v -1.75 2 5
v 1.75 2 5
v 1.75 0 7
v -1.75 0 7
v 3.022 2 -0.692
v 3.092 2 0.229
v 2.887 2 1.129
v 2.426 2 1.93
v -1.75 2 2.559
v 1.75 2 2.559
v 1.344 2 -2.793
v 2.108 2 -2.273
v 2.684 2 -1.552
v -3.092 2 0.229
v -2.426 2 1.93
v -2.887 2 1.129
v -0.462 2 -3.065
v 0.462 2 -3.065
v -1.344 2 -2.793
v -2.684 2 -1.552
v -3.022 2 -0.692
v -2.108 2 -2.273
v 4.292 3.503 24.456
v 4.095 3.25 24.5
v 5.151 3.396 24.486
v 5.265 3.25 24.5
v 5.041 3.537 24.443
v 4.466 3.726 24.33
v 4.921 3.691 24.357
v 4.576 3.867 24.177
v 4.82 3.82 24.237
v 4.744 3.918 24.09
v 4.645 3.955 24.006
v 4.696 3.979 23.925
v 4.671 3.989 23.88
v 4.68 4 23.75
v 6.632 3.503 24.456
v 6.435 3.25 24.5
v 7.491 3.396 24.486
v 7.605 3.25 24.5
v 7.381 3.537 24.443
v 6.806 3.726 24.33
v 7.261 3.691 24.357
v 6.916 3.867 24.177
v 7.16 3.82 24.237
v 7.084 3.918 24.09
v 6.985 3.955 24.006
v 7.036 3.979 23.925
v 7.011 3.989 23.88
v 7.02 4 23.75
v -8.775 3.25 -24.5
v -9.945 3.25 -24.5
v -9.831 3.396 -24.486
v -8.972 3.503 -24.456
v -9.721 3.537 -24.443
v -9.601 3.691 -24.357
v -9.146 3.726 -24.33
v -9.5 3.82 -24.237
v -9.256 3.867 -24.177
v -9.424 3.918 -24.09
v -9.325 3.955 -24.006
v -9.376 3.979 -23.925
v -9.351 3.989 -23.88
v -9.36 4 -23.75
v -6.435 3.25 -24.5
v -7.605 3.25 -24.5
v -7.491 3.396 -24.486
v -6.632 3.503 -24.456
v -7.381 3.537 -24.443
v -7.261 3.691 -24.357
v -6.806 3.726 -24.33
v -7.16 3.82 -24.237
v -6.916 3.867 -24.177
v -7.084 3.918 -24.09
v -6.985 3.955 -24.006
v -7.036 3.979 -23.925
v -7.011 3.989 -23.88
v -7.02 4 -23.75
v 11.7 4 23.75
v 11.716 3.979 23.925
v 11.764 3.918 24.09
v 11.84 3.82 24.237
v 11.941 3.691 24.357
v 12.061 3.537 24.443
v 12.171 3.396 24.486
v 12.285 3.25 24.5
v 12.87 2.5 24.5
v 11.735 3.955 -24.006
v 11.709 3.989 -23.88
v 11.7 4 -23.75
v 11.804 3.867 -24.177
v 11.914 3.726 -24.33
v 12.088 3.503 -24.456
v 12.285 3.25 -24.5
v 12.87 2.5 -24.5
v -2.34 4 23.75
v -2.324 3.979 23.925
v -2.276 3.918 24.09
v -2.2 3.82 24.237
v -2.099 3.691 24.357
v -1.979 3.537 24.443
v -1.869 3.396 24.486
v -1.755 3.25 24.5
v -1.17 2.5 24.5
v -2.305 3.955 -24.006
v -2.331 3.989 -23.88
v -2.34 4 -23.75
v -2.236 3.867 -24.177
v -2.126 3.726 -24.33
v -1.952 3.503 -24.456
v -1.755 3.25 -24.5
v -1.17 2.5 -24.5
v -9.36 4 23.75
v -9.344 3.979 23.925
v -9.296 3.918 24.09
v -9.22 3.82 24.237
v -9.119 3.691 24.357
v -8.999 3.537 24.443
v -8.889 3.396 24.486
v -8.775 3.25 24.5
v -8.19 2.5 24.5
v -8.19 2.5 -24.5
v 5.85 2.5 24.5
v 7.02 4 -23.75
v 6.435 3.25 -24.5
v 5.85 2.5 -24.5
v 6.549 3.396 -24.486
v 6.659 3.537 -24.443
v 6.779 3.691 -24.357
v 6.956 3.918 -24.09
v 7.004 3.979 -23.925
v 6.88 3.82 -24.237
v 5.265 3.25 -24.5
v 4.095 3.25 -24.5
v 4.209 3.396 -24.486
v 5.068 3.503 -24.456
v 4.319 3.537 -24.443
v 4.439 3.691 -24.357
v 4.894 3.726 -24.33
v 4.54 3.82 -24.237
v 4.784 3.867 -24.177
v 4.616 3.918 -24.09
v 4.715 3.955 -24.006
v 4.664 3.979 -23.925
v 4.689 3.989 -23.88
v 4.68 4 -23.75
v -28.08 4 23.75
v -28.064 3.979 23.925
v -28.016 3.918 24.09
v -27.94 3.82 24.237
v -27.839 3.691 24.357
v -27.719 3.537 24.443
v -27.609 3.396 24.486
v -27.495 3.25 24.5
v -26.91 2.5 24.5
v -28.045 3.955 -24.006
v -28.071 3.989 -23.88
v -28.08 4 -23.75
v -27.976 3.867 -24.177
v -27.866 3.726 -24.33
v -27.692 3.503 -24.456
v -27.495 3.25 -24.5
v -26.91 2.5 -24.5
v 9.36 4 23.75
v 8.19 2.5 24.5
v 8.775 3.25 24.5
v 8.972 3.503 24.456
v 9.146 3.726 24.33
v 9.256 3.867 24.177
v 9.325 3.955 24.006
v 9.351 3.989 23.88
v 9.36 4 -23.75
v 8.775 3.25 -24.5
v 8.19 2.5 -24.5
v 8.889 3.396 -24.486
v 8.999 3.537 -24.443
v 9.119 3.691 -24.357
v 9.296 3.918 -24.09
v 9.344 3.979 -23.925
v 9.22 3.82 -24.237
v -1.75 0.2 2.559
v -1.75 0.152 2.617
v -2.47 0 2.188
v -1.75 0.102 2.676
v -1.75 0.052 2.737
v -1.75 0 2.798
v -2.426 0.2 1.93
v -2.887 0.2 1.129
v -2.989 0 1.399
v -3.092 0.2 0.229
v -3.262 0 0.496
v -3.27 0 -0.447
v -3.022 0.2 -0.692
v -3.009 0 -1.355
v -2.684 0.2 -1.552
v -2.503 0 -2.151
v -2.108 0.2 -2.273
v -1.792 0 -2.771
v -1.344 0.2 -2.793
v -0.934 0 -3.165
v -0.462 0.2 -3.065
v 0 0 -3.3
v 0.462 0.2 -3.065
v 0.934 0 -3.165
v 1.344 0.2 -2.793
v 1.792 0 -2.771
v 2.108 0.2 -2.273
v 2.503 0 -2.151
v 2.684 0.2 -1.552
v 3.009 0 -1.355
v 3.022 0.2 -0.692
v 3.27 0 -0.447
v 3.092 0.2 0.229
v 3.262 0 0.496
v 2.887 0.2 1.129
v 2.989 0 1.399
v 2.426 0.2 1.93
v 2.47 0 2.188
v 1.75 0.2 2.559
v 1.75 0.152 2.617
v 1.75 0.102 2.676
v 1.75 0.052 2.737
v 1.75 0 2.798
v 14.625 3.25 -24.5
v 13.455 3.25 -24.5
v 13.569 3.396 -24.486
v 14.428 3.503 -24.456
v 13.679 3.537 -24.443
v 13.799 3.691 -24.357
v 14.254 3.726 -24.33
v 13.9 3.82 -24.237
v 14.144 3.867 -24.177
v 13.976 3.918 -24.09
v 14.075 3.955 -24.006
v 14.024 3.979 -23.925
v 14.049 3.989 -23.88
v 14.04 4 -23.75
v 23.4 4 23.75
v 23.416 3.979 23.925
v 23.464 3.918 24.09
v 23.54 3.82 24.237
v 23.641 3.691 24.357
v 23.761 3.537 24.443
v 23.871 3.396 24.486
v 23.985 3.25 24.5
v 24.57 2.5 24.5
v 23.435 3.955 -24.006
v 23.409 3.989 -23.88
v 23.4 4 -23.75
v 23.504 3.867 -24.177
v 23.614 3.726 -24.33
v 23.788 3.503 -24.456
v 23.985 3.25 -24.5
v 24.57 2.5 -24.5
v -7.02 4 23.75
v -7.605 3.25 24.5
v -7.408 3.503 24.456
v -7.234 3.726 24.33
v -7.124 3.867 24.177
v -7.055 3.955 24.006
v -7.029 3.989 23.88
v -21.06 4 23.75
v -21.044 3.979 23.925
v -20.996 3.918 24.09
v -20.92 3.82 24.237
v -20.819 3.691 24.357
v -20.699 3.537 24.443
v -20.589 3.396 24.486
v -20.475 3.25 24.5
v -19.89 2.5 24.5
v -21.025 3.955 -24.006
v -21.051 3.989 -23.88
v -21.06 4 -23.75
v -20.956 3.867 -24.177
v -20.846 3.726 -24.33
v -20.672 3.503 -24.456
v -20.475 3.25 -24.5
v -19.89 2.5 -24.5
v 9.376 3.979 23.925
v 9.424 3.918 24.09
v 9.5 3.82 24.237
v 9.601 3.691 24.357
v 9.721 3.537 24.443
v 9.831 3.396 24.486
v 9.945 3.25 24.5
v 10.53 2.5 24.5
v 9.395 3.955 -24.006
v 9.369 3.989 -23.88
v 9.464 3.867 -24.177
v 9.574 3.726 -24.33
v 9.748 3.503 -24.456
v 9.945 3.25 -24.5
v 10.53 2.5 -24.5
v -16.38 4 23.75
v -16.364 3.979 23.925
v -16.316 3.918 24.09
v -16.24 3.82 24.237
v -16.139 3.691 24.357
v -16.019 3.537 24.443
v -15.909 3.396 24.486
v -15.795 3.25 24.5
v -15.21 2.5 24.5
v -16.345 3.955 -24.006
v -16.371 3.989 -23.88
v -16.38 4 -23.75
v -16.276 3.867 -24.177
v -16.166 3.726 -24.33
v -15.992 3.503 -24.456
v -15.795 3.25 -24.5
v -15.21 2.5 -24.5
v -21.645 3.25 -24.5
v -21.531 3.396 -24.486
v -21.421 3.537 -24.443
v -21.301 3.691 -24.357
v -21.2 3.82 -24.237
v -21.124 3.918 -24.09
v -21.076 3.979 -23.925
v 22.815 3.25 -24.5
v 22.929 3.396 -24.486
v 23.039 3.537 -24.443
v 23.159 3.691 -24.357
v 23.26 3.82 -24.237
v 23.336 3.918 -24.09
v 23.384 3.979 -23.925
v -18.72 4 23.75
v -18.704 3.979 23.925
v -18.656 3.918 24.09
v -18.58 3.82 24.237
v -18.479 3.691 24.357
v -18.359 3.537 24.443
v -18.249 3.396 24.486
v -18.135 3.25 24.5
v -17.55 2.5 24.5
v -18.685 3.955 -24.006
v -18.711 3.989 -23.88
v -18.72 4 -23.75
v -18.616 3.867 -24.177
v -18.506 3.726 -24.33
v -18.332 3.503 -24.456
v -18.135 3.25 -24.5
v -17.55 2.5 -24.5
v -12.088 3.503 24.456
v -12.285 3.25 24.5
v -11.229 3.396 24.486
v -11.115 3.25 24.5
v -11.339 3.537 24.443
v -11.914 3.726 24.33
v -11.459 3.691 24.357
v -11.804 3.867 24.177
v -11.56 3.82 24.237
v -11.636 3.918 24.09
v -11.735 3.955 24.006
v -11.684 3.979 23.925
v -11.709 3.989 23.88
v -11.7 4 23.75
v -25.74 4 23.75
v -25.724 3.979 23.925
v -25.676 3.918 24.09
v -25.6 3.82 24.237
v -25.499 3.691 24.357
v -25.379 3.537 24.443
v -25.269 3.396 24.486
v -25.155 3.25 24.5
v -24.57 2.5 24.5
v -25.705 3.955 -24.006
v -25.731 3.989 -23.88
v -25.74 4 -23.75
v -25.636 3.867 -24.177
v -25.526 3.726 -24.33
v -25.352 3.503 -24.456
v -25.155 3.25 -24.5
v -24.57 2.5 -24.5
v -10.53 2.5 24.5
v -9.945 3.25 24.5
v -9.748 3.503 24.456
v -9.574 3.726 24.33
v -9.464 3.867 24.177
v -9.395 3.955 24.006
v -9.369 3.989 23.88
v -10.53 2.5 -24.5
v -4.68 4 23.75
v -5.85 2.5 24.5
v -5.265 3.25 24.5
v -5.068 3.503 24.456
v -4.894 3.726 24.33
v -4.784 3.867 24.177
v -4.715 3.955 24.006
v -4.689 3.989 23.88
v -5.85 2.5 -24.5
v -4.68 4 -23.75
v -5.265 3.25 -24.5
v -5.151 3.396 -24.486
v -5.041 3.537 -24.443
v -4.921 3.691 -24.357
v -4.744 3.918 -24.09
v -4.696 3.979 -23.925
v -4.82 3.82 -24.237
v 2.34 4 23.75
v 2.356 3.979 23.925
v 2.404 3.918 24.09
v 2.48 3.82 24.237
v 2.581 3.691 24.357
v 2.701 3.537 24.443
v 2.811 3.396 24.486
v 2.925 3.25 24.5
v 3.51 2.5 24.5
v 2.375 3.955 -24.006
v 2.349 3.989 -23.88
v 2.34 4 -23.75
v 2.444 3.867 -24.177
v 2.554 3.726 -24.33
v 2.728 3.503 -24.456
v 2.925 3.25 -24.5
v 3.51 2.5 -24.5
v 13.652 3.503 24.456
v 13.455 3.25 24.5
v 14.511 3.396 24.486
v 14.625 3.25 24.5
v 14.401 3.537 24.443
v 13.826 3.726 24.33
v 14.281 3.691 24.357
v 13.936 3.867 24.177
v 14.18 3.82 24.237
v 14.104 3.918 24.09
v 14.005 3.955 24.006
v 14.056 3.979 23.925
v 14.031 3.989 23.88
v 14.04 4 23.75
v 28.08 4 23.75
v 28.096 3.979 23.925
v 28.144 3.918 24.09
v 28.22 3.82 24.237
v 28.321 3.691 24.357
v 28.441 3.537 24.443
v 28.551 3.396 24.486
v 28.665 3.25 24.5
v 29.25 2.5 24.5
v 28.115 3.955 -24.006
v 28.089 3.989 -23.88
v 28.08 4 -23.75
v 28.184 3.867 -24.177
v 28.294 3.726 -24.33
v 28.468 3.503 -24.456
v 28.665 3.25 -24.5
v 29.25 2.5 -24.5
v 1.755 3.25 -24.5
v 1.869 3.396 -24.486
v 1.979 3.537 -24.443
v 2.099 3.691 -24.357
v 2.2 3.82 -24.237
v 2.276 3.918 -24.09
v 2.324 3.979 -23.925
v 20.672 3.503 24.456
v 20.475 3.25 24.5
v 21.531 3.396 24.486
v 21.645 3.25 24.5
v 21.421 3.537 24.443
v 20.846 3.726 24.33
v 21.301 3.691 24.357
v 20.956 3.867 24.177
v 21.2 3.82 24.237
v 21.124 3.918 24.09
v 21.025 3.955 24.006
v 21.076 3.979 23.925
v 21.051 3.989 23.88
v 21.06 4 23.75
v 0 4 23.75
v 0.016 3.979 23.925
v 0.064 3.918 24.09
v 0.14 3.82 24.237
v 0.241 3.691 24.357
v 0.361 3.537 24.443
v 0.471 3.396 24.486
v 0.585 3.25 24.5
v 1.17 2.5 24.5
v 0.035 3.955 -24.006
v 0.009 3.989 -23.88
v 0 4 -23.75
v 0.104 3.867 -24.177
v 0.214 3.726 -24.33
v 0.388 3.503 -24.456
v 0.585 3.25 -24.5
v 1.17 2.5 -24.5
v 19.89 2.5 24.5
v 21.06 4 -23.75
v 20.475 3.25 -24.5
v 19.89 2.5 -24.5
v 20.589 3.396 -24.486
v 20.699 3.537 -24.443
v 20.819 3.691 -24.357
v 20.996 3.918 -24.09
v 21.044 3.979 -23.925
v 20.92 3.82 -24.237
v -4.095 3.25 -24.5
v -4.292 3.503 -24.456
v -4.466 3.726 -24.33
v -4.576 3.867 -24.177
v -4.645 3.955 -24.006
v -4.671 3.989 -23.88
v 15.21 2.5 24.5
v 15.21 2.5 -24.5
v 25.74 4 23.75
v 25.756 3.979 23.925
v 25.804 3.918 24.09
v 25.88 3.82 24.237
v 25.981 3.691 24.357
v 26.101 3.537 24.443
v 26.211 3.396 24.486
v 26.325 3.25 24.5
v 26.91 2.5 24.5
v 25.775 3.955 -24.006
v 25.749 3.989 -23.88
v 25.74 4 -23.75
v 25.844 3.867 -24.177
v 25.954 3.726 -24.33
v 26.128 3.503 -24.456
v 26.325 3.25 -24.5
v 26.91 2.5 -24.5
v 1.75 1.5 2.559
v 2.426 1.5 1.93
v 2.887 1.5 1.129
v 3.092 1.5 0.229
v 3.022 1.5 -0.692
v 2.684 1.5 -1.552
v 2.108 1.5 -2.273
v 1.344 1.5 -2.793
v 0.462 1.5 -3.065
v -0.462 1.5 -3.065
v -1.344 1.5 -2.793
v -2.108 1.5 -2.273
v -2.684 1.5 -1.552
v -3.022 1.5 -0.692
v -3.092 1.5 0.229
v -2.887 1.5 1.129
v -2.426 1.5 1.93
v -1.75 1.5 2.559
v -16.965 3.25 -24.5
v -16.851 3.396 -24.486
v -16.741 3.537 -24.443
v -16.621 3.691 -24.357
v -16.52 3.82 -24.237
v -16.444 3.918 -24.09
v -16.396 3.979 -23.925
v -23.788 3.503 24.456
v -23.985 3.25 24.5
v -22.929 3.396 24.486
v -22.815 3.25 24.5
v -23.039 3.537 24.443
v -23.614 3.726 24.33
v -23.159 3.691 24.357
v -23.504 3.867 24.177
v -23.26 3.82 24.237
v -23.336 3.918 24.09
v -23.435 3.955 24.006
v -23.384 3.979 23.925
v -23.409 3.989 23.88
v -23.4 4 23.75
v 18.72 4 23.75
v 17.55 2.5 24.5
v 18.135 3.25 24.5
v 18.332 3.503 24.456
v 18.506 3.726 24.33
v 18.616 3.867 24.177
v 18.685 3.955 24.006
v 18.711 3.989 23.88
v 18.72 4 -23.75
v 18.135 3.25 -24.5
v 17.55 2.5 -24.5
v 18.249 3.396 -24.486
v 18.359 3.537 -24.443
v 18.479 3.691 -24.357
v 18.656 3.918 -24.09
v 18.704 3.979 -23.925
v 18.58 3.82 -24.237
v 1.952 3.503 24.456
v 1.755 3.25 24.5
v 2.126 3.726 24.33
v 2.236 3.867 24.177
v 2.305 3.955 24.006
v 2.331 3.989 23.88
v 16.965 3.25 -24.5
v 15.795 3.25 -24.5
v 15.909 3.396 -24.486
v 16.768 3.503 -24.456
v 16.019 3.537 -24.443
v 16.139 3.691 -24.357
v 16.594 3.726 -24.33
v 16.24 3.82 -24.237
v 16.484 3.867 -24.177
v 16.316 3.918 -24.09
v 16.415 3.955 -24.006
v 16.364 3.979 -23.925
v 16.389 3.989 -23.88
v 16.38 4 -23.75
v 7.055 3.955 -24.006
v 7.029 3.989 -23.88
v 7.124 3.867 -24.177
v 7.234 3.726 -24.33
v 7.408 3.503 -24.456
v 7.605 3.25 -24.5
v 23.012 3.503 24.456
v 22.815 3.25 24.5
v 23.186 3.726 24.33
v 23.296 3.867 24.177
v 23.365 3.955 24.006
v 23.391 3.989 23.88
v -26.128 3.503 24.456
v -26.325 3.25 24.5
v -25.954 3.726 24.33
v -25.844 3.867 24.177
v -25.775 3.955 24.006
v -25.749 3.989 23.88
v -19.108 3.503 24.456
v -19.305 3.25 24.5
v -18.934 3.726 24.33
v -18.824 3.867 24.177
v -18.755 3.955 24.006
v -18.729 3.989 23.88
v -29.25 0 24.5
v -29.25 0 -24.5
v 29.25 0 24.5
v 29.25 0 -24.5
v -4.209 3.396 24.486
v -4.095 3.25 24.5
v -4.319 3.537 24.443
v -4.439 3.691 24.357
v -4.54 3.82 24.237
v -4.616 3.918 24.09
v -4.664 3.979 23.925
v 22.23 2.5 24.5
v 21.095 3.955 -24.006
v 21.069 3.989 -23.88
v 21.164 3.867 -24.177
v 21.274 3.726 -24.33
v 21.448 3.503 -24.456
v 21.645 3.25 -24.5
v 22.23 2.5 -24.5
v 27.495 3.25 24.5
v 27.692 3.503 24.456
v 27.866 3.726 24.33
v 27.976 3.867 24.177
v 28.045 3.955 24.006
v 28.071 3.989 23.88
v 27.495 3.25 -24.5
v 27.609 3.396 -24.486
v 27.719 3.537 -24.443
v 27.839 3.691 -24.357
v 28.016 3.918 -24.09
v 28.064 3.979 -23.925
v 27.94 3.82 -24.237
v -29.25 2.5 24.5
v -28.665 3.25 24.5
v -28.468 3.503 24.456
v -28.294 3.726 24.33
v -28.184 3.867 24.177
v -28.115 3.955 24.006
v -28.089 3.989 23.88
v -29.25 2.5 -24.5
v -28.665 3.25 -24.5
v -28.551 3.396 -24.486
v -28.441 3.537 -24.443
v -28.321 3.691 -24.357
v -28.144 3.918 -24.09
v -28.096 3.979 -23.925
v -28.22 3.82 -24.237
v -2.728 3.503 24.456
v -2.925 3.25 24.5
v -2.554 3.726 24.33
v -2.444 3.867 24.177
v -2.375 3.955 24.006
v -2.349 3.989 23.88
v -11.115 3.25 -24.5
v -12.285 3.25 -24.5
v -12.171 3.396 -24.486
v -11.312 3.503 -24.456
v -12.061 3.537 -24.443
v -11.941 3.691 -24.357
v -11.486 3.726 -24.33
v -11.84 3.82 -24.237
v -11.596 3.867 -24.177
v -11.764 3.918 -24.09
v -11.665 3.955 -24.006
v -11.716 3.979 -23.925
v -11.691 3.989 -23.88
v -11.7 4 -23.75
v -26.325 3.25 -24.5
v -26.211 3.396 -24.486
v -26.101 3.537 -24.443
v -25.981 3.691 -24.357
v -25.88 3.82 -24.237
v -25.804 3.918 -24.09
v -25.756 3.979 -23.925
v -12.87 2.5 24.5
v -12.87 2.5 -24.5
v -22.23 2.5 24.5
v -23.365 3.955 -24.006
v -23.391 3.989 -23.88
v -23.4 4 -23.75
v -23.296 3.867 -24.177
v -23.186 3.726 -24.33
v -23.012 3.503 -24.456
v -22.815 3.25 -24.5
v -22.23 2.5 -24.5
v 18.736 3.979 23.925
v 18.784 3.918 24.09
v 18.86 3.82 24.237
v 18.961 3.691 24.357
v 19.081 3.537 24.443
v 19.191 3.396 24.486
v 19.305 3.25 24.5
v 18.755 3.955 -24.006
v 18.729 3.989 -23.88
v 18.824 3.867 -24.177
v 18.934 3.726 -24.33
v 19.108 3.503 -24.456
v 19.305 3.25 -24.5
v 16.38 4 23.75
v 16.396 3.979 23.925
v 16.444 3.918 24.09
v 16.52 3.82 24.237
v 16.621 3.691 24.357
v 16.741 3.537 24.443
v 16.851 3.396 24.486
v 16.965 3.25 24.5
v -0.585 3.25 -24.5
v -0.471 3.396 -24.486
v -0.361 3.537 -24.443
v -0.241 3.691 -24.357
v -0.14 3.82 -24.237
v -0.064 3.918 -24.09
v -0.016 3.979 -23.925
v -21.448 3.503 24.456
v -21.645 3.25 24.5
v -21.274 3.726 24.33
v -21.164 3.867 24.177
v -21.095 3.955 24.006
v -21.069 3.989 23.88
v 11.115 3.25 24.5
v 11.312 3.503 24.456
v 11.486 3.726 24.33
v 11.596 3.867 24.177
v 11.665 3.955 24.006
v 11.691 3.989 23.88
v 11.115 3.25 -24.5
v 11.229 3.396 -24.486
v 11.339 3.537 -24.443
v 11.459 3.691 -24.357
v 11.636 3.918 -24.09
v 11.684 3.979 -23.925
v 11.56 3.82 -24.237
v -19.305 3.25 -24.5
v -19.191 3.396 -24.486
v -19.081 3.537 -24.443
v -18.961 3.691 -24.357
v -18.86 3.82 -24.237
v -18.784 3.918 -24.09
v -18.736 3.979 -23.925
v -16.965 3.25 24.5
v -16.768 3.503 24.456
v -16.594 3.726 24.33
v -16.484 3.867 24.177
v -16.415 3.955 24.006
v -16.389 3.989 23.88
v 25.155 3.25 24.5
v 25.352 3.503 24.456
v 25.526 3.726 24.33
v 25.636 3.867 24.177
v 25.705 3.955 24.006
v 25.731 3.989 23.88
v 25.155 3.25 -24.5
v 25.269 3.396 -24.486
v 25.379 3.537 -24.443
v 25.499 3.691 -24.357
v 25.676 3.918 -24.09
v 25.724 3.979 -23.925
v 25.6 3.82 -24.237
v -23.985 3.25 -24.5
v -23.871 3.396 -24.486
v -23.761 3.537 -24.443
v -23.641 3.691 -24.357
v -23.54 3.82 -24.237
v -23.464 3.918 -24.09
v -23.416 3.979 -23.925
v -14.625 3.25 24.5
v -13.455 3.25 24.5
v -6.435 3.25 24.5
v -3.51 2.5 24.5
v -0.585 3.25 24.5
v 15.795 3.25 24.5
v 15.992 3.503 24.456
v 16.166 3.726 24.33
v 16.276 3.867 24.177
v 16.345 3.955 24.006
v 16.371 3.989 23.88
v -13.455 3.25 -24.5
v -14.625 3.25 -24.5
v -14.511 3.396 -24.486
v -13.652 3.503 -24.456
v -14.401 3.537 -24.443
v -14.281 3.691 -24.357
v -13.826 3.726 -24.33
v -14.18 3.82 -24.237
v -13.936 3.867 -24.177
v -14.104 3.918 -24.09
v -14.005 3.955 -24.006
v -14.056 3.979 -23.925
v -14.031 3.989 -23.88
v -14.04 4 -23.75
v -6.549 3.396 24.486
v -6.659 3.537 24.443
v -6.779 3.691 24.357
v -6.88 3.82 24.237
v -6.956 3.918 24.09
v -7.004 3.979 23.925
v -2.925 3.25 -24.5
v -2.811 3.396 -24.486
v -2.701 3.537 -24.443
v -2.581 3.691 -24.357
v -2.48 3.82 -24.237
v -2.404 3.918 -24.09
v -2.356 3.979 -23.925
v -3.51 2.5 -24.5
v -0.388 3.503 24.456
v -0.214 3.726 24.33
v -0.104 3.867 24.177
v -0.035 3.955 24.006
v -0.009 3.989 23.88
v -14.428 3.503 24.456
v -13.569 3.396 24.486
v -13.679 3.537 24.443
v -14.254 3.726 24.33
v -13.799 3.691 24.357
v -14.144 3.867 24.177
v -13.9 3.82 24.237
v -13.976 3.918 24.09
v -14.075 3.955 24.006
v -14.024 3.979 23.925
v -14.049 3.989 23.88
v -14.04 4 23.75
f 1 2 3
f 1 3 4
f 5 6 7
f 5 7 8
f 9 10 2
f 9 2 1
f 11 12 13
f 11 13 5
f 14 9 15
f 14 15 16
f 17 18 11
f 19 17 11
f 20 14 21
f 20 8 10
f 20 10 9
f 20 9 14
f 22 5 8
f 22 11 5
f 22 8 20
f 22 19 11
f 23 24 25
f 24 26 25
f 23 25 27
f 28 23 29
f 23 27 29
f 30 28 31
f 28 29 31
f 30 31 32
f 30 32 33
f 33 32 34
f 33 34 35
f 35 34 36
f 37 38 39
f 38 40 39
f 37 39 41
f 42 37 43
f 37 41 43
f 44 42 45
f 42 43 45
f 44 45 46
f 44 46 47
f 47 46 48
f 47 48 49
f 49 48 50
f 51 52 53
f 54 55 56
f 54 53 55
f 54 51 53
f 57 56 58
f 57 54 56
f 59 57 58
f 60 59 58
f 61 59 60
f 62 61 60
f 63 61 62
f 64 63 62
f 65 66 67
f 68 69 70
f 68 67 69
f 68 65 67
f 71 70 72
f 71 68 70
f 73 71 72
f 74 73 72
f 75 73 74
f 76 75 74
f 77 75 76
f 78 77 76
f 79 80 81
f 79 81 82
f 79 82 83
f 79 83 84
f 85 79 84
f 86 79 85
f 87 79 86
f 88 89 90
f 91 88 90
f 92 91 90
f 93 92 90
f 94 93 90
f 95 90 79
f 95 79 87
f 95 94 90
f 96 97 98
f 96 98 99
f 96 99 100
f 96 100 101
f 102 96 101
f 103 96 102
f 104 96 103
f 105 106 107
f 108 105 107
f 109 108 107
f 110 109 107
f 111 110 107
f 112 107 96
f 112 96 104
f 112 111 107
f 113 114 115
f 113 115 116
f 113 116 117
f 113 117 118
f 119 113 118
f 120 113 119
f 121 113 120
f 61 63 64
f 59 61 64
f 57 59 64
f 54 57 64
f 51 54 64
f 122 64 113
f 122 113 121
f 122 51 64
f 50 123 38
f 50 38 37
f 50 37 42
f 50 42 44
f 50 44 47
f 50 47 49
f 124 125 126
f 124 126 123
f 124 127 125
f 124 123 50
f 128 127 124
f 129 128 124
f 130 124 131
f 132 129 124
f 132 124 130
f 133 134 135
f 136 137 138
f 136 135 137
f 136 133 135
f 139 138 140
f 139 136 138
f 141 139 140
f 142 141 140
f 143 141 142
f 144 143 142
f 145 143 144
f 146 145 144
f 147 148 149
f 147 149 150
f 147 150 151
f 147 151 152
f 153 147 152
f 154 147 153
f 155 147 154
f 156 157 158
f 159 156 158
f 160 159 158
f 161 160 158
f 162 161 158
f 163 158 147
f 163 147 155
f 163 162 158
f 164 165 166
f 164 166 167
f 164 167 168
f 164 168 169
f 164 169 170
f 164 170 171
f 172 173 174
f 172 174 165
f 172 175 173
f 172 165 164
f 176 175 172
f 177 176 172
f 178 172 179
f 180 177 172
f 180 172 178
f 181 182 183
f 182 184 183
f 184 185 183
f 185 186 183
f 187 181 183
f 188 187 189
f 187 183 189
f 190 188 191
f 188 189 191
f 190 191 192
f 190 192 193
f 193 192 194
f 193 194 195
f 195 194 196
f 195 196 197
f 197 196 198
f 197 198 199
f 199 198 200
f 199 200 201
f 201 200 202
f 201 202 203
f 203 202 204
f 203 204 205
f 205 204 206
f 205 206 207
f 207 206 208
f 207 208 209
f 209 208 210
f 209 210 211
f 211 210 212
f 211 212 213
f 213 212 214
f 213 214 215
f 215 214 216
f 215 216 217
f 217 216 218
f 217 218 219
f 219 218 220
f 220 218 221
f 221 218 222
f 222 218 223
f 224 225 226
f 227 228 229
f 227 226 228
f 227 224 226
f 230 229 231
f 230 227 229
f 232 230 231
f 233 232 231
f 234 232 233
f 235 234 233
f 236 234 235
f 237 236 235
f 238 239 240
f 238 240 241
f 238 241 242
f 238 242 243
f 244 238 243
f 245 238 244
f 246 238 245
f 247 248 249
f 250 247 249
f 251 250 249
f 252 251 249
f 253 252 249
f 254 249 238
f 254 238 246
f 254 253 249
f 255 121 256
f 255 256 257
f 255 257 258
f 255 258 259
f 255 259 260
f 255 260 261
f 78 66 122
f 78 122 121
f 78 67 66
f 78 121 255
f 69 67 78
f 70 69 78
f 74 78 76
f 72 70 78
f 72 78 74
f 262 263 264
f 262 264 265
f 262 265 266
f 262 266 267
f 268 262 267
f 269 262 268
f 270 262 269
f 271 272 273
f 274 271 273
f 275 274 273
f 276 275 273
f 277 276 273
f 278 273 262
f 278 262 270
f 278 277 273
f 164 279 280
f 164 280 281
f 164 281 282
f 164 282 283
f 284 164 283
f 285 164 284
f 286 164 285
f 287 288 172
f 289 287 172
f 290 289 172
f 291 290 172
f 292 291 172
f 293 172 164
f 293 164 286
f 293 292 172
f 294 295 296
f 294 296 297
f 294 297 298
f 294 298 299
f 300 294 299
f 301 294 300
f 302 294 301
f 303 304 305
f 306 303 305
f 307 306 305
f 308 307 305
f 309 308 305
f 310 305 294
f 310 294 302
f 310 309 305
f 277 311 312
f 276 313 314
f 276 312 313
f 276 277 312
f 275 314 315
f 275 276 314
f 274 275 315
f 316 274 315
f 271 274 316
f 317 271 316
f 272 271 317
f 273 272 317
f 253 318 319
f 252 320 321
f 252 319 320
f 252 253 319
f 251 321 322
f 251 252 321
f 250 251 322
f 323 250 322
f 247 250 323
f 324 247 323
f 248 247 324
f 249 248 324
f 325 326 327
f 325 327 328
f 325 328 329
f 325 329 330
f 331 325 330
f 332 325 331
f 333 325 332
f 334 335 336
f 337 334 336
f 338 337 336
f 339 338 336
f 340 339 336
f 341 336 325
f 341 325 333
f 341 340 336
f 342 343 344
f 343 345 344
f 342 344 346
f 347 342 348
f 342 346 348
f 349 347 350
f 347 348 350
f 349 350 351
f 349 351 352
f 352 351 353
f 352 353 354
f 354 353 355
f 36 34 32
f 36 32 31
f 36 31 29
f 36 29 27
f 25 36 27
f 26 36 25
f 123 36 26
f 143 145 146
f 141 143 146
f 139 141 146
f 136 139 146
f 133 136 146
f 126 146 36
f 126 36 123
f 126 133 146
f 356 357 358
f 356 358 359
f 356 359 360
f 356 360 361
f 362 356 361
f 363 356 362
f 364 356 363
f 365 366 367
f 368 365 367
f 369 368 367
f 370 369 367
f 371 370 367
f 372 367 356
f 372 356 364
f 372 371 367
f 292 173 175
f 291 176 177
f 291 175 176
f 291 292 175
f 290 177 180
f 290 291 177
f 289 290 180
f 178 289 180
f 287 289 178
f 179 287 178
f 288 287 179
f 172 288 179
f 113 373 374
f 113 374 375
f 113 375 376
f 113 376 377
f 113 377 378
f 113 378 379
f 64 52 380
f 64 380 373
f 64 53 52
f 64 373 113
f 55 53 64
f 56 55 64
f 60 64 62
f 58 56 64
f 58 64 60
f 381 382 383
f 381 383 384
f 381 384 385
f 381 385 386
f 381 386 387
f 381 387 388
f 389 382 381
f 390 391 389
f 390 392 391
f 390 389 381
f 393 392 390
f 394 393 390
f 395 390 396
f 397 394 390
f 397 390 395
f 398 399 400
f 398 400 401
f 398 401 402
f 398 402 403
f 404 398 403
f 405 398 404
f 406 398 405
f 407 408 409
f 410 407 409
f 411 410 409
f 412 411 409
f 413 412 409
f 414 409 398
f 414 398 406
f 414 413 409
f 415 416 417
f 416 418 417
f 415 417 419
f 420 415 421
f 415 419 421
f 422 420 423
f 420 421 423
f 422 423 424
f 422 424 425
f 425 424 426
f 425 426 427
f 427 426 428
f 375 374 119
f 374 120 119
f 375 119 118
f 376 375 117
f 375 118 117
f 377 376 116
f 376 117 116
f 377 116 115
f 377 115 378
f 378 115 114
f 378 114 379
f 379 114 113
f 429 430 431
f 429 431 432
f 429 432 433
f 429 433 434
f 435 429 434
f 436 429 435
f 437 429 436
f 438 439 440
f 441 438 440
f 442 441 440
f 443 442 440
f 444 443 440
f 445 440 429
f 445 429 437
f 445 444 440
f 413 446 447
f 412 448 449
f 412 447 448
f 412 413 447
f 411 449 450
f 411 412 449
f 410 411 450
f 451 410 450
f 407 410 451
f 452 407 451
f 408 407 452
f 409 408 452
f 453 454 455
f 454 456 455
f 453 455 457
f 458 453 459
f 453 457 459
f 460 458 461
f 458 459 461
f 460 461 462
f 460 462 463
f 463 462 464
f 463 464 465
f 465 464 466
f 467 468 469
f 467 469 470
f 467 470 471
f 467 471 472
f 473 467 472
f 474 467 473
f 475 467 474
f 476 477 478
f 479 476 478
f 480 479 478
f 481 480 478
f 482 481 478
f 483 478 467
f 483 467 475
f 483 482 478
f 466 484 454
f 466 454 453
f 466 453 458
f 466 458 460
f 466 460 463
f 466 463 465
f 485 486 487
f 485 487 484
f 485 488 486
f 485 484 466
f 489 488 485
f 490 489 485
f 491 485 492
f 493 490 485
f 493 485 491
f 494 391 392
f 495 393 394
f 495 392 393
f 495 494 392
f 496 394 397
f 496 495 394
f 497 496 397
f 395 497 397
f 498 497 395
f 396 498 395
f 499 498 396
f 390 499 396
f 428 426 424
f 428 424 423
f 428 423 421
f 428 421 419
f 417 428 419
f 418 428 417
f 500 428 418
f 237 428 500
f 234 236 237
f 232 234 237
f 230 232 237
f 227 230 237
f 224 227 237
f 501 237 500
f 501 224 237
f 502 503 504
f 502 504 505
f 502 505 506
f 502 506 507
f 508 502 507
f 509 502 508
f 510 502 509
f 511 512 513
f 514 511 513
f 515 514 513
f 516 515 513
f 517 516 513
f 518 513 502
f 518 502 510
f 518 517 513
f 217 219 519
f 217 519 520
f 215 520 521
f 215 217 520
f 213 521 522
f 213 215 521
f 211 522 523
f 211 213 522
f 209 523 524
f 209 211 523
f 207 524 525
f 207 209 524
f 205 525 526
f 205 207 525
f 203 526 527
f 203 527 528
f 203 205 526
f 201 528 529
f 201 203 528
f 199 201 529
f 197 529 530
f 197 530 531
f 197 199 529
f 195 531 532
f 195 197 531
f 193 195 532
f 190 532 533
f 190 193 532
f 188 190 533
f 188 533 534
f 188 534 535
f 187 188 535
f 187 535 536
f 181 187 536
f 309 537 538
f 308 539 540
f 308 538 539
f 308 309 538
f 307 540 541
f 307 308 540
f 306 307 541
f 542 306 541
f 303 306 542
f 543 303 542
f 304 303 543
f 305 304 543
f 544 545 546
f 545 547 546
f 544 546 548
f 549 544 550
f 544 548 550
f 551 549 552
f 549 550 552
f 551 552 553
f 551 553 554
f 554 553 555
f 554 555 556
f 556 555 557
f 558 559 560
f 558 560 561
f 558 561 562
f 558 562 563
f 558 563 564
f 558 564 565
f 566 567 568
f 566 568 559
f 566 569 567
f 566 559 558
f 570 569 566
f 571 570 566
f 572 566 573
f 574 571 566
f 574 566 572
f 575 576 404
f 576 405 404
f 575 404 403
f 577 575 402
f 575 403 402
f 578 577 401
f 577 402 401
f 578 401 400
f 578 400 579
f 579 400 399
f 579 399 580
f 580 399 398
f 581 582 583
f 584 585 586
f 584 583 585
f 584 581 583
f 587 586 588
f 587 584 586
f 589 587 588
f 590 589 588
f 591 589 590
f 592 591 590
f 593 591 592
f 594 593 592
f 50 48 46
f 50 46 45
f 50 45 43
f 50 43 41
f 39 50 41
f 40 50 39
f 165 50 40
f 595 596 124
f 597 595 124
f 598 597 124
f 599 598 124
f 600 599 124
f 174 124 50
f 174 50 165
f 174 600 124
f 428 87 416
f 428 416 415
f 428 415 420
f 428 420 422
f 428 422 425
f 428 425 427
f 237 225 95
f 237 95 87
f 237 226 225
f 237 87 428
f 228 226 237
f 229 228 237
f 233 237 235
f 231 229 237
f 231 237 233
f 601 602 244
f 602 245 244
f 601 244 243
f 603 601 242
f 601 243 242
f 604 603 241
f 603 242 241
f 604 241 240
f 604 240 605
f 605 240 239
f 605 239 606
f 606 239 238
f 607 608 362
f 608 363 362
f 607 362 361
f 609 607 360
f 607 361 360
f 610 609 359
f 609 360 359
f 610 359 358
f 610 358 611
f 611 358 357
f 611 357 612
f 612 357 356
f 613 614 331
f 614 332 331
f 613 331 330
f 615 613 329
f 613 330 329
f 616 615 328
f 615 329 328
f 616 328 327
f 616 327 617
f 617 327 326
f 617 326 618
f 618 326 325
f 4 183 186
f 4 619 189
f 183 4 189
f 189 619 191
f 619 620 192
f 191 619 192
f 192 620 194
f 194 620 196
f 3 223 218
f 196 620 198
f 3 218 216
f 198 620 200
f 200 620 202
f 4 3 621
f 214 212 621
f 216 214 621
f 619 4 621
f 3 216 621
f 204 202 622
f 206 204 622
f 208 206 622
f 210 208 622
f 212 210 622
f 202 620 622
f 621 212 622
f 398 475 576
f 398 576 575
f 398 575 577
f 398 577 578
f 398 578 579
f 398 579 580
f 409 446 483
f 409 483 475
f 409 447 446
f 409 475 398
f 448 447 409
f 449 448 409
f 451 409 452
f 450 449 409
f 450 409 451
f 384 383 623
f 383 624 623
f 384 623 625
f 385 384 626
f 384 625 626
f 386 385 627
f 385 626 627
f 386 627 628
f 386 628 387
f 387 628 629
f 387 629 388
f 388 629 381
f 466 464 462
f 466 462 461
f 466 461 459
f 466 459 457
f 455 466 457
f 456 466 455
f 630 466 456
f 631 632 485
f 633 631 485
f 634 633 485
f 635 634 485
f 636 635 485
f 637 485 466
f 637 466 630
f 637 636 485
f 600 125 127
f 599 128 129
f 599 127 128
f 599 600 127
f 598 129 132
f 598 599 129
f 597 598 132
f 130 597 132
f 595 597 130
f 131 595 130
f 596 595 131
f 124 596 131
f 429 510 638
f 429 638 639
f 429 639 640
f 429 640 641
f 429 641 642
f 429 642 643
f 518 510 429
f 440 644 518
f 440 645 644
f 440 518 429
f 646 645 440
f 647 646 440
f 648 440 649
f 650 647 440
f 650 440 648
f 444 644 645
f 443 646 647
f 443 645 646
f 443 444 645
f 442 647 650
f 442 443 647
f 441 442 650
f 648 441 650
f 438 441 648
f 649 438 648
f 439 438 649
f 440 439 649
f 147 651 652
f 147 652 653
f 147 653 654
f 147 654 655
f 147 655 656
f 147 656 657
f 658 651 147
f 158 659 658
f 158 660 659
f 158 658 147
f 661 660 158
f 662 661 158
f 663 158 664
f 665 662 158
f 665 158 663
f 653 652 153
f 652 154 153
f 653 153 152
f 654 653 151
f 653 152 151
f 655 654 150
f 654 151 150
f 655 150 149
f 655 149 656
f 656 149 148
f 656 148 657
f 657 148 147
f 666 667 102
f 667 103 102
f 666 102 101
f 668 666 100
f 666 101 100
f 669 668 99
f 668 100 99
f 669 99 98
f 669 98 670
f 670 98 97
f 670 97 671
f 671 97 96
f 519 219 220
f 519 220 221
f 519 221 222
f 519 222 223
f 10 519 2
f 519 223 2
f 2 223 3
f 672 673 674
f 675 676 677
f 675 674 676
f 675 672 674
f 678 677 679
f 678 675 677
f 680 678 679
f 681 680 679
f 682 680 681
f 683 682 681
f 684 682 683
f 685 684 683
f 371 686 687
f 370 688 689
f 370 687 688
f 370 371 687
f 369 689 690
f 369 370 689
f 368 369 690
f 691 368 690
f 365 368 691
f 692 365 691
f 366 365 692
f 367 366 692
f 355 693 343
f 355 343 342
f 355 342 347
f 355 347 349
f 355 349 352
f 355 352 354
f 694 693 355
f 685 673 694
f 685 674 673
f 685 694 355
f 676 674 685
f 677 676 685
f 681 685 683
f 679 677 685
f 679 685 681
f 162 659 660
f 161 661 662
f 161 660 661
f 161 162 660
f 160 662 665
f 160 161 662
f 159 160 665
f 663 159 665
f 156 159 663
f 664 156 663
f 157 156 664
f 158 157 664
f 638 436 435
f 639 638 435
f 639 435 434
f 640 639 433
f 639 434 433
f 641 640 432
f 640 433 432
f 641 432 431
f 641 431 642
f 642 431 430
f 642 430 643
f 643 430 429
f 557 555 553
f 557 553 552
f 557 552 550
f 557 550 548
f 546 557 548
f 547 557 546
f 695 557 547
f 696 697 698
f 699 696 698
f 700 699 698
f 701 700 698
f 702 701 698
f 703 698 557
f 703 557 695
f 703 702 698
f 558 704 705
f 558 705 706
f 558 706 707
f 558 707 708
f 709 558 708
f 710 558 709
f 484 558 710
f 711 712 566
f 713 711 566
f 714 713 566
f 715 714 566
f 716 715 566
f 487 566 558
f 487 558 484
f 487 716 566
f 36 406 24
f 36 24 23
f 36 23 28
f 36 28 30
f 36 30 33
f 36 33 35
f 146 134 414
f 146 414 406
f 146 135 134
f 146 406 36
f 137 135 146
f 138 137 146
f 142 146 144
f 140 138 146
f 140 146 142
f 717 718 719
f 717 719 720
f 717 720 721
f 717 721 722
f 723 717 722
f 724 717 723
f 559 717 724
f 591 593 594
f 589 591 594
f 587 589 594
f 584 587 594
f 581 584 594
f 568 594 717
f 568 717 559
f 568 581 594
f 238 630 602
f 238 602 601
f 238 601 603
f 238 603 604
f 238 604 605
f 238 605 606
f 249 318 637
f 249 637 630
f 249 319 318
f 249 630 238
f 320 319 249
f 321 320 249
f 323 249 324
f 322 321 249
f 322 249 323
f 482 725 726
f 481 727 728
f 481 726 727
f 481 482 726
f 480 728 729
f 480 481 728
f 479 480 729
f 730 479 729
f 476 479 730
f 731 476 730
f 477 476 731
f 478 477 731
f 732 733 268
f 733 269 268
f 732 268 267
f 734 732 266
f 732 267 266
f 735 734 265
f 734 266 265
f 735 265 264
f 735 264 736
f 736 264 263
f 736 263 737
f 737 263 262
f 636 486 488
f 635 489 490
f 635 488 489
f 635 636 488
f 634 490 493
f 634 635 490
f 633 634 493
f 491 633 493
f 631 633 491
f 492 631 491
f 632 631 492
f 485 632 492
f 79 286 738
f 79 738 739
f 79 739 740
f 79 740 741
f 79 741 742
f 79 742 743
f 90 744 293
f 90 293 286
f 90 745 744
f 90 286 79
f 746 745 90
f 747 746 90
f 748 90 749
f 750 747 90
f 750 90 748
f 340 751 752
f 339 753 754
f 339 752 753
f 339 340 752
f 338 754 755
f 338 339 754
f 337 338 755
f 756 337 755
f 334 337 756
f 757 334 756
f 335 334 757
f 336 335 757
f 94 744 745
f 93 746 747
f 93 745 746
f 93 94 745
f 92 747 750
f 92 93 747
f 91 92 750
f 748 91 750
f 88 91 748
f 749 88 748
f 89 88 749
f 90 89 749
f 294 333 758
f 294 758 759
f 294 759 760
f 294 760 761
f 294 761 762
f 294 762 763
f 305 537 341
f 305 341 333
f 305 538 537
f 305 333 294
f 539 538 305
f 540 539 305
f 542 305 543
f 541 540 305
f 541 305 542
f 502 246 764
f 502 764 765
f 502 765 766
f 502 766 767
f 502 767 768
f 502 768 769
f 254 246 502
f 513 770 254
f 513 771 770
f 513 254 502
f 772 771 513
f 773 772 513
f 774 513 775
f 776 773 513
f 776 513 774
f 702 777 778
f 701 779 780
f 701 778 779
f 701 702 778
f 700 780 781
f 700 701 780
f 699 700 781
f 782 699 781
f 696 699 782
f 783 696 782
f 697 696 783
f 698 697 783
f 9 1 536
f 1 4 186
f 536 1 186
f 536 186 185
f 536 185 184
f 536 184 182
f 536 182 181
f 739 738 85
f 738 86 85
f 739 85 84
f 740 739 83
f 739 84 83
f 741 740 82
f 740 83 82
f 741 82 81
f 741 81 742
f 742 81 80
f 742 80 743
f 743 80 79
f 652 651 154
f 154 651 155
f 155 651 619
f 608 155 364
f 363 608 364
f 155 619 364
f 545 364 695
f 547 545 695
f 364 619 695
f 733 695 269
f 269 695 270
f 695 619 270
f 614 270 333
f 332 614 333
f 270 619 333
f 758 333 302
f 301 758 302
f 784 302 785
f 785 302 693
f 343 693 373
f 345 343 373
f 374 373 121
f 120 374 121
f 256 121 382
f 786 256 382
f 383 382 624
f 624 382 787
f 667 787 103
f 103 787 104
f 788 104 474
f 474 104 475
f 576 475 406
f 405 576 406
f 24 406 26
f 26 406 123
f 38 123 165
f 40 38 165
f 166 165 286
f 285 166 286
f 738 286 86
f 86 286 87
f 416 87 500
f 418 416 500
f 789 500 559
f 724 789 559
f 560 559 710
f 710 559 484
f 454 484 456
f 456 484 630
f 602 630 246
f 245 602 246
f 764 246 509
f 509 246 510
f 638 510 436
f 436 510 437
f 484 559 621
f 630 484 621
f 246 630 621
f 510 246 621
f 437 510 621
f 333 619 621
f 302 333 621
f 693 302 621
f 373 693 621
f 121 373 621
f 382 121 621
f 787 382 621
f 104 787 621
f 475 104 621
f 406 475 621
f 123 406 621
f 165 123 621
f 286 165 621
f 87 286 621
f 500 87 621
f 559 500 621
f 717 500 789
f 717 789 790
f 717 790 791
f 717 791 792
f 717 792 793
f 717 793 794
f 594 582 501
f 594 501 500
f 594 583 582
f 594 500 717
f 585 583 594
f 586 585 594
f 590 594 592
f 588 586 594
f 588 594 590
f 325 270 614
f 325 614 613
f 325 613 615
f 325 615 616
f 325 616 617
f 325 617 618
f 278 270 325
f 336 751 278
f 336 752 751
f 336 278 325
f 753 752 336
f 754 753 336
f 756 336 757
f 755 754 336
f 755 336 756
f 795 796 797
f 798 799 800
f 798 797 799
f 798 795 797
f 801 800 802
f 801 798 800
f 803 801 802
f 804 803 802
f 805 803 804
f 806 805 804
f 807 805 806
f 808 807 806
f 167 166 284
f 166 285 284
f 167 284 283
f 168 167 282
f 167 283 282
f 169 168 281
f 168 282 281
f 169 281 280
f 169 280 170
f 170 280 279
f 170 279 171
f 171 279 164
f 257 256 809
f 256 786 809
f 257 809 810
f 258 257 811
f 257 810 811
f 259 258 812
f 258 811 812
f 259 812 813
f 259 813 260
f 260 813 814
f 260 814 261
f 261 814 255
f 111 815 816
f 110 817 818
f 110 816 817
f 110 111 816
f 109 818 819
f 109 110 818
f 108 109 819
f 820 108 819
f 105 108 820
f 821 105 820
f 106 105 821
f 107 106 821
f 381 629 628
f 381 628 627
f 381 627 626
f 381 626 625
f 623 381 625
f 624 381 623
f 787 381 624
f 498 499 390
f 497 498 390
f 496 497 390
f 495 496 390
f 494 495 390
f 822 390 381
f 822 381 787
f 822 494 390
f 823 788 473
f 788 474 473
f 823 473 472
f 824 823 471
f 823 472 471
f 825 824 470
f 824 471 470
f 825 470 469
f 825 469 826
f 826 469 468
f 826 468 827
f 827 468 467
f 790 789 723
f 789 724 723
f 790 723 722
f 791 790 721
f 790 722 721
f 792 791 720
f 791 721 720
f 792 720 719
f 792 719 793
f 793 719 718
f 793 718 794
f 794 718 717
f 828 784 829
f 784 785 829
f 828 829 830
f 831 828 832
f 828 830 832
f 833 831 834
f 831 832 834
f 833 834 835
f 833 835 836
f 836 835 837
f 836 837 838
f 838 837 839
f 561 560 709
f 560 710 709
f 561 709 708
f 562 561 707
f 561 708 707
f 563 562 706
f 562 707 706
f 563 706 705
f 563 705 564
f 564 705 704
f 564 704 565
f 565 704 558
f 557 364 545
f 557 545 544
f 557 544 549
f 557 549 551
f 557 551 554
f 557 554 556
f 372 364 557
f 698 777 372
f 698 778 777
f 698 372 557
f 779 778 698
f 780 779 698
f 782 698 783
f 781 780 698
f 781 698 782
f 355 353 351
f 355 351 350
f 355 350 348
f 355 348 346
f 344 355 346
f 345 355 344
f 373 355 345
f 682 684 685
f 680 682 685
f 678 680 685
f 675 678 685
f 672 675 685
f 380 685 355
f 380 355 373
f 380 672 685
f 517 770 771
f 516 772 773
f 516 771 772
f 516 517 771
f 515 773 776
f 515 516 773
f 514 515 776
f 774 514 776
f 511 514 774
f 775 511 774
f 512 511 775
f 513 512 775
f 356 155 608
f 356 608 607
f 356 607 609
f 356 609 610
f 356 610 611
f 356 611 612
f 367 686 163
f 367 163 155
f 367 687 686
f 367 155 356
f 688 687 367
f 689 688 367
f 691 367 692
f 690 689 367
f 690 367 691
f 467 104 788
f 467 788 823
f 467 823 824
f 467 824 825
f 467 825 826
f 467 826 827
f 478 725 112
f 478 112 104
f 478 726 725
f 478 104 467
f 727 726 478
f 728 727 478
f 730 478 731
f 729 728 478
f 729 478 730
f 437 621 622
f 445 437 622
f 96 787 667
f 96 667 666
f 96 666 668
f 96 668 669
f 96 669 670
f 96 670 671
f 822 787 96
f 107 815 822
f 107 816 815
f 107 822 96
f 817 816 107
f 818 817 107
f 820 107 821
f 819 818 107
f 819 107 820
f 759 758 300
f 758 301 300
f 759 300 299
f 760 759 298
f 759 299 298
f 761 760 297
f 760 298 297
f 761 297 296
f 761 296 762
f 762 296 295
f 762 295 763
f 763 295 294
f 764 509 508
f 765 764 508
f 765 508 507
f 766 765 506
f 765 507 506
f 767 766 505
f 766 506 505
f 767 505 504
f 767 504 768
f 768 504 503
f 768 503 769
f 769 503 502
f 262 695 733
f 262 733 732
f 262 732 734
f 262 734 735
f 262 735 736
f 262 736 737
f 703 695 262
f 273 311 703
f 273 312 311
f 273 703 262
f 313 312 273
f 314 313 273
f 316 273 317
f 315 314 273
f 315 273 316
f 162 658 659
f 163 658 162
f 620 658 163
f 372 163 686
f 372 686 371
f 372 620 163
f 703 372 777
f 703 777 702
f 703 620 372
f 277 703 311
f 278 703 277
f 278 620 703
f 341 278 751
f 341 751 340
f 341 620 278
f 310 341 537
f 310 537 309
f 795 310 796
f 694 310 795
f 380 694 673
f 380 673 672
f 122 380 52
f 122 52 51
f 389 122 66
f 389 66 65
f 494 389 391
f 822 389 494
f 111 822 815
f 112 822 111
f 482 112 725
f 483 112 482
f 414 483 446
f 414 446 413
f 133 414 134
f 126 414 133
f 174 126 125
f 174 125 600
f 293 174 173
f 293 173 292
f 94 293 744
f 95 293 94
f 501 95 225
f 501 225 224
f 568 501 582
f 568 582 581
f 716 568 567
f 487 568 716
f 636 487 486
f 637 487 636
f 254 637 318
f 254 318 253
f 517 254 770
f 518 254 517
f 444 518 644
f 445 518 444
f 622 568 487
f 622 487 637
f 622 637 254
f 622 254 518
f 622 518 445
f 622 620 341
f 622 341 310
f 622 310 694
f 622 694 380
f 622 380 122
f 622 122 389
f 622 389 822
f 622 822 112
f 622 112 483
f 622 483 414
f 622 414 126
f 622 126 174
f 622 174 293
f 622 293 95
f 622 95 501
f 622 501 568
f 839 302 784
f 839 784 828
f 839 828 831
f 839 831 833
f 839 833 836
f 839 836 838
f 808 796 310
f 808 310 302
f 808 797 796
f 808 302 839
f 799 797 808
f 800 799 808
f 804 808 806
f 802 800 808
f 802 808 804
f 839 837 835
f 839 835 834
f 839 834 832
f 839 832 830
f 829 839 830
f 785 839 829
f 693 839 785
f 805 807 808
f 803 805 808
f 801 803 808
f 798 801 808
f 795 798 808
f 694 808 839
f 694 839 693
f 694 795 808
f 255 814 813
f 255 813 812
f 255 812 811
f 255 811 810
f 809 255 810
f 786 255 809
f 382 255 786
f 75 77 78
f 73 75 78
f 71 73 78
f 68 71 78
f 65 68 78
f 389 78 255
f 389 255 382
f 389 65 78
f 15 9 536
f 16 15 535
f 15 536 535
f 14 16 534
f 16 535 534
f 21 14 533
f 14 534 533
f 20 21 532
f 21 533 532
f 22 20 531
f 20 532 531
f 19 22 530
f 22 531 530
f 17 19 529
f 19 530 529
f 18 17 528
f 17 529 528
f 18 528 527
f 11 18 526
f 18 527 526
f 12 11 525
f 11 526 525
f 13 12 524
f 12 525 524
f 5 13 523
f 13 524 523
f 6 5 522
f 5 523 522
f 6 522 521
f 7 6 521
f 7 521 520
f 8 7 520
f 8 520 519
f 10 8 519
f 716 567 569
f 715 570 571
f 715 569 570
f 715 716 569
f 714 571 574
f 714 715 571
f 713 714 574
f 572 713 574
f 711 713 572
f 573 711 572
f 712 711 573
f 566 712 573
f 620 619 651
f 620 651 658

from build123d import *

# Parameters (mm, degrees)
SKETCH1_W           = 58.5
SKETCH1_H           = 49
SKETCH1_R           = 3.1
BOSS_EXTRUDE1_DEPTH = 1.5
BOSS_EXTRUDE2_DEPTH = 49
CUT_EXTRUDE1_DEPTH  = 2
CHAMFER2_SIZE       = 0.2
CUT_EXTRUDE3_DEPTH  = 64.549193543
CHAMFER3_SIZE       = 2


with BuildPart() as part:
    # Sketch1 → Boss-Extrude1 (new body)
    with BuildSketch(Plane(origin=(0, 0, 0), x_dir=(1, 0, 0), z_dir=(0, 1, 0))):
        Rectangle(SKETCH1_W, SKETCH1_H)
        with Locations(Location((0, 0, 0), (0, 0, 270))):
            Circle(SKETCH1_R, mode=Mode.SUBTRACT)
    extrude(amount=BOSS_EXTRUDE1_DEPTH)

    # Sketch2 → Boss-Extrude2 (add)
    with BuildSketch(Plane(origin=(0, 0, -24.5), x_dir=(-1, 0, 0), z_dir=(0, 0, -1))):
        Polygon((-29.25, 1.5), (29.25, 1.5), (29.25, 2.5), (28.08, 4), (26.91, 2.5), (25.74, 4), (24.57, 2.5), (23.4, 4), (22.23, 2.5), (21.06, 4), (19.89, 2.5), (18.72, 4), (17.55, 2.5), (16.38, 4), (15.21, 2.5), (14.04, 4), (12.87, 2.5), (11.7, 4), (10.53, 2.5), (9.36, 4), (8.19, 2.5), (7.02, 4), (5.85, 2.5), (4.68, 4), (3.51, 2.5), (2.34, 4), (1.17, 2.5), (0, 4), (-1.17, 2.5), (-2.34, 4), (-3.51, 2.5), (-4.68, 4), (-5.85, 2.5), (-7.02, 4), (-8.19, 2.5), (-9.36, 4), (-10.53, 2.5), (-11.7, 4), (-12.87, 2.5), (-14.04, 4), (-15.21, 2.5), (-16.38, 4), (-17.55, 2.5), (-18.72, 4), (-19.89, 2.5), (-21.06, 4), (-22.23, 2.5), (-23.4, 4), (-24.57, 2.5), (-25.74, 4), (-26.91, 2.5), (-28.08, 4), (-29.25, 2.5), align=None)
    extrude(amount=-BOSS_EXTRUDE2_DEPTH)

    # Sketch3 → Cut-Extrude1 (cut)
    with BuildSketch(Plane(origin=(0, 0, 0), x_dir=(-1, 0, 0), z_dir=(0, -1, 0))):
        with BuildLine():
            Line((-1.75, -2.558808316), (-1.75, -5))
            Line((-1.75, -5), (1.75, -5))
            Line((1.75, -5), (1.75, -2.558808316))
            ThreePointArc((1.75, -2.558808316), (0, 3.1), (-1.75, -2.558808316))
        make_face()
    extrude(amount=-CUT_EXTRUDE1_DEPTH, mode=Mode.SUBTRACT)

    # Chamfer2
    chamfer2_edges = [part.edges().sort_by_distance(p)[0] for p in [
        (0, 0, -3.1),
    ]]
    chamfer(chamfer2_edges, length=CHAMFER2_SIZE)

    # Sketch4 → Cut-Extrude3 (cut, through all)
    with BuildSketch(Plane(origin=(29.25, 0, 0), x_dir=(0, 0, -1), z_dir=(1, 0, 0))):
        with BuildLine():
            Line((-23.75, 4), (-24.5, 4))
            Line((-24.5, 4), (-24.5, 3.25))
            ThreePointArc((-24.5, 3.25), (-24.280330086, 3.780330086), (-23.75, 4))
        make_face()
    cut_extrude3 = extrude(amount=-CUT_EXTRUDE3_DEPTH, mode=Mode.SUBTRACT)

    # Mirror1: Cut-Extrude3 across plane
    add(cut_extrude3.mirror(Plane.XY), mode=Mode.SUBTRACT)

    # Chamfer3
    chamfer3_edges = [part.edges().sort_by_distance(p)[0] for p in [
        (0, 0, 5),
    ]]
    chamfer(chamfer3_edges, length=CHAMFER3_SIZE - 0.0001)  # a hair under: the kernel refuses the full size


solid = part.part
